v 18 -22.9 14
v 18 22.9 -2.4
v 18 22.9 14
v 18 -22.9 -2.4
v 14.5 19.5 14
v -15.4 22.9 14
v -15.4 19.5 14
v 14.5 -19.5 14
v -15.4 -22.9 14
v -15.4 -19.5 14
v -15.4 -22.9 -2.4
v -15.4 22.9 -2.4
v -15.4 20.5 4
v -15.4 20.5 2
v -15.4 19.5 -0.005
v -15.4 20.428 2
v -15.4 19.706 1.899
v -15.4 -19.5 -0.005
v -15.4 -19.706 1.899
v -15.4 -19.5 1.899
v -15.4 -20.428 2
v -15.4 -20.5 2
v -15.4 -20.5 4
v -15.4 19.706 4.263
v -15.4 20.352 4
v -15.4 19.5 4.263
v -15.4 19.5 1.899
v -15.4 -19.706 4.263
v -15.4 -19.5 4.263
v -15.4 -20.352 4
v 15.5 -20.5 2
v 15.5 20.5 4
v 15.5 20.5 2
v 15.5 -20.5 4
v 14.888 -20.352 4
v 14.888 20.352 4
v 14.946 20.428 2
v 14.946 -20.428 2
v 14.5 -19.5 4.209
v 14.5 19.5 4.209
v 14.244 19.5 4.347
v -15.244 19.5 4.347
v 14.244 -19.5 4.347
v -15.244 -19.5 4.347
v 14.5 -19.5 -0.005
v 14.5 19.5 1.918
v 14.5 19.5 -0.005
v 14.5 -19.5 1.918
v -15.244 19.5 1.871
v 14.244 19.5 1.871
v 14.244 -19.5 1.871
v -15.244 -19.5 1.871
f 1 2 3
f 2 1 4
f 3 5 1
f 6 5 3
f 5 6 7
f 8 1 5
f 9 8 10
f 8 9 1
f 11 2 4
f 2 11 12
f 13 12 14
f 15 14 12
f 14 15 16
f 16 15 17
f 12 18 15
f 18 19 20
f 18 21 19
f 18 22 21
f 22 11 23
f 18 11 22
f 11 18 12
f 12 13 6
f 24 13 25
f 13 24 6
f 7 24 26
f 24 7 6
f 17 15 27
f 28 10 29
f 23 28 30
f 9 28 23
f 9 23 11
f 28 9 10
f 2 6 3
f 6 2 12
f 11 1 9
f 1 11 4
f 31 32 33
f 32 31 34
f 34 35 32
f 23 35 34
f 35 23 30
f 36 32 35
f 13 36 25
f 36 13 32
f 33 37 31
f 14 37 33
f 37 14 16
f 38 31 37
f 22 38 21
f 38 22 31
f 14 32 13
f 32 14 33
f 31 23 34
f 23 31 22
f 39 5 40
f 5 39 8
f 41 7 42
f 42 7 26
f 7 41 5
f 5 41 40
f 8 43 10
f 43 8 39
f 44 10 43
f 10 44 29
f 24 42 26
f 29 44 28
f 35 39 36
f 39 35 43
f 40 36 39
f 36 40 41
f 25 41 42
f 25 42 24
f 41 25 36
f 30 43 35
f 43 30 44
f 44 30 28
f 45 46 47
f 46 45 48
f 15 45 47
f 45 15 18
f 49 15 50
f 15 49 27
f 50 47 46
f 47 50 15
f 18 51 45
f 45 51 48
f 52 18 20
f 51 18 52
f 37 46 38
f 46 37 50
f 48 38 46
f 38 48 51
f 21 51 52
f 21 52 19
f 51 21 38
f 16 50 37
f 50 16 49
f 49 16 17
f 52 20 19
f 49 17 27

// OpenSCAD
// preview[view:west, tilt:top diagonal]
pcb_height=31;
pcb_width=41;
pcb_thick=2;
grove=1;
walls=2.4;
bottom_offset=2;
top_offset=10;
chamfer_top=7;//[0:10]
chamfer_bottom=3;//[0:10]

chamfer_top_=chamfer_top/10;
chamfer_bottom_=chamfer_bottom/10;

difference(){
//box
translate([walls/2+0.1,0,pcb_thick/2+bottom_offset/2+top_offset/2-walls/2]){
cube([pcb_height+walls,pcb_width+walls*2,pcb_thick+walls*2+bottom_offset+top_offset-walls],center=true);
}

//pcb
color("green")
translate([0,0,pcb_thick/2+bottom_offset]){
cube([pcb_height,pcb_width,pcb_thick],center=true);
}

//grove
color("blue")
translate([-grove/2,0,bottom_offset + pcb_thick +top_offset/2]){
cube([pcb_height-grove,pcb_width-grove*2,top_offset+0.01],center=true);
}

//chamfer top
color("red")
translate([-grove/2,0,pcb_thick+walls/2+bottom_offset-0.01]){
linear_extrude(height = walls+0.1, center = true, convexity = 3, scale = chamfer_top_){
square(size = [pcb_height, pcb_width], center = true);
}
}

//bottom offset
color("Gray")
translate([-grove/2,0,bottom_offset/2]){
cube([pcb_height-grove,pcb_width-grove*2,bottom_offset+0.01],center=true);
}

//chamfer bottom
color("Purple")
translate([-grove/2,0,bottom_offset/2+0.01]){
mirror([0,0,1]) 
linear_extrude(height = bottom_offset, center = true, convexity = 3, scale = chamfer_bottom_){
square(size = [pcb_height, pcb_width], center = true);
}
}

}
